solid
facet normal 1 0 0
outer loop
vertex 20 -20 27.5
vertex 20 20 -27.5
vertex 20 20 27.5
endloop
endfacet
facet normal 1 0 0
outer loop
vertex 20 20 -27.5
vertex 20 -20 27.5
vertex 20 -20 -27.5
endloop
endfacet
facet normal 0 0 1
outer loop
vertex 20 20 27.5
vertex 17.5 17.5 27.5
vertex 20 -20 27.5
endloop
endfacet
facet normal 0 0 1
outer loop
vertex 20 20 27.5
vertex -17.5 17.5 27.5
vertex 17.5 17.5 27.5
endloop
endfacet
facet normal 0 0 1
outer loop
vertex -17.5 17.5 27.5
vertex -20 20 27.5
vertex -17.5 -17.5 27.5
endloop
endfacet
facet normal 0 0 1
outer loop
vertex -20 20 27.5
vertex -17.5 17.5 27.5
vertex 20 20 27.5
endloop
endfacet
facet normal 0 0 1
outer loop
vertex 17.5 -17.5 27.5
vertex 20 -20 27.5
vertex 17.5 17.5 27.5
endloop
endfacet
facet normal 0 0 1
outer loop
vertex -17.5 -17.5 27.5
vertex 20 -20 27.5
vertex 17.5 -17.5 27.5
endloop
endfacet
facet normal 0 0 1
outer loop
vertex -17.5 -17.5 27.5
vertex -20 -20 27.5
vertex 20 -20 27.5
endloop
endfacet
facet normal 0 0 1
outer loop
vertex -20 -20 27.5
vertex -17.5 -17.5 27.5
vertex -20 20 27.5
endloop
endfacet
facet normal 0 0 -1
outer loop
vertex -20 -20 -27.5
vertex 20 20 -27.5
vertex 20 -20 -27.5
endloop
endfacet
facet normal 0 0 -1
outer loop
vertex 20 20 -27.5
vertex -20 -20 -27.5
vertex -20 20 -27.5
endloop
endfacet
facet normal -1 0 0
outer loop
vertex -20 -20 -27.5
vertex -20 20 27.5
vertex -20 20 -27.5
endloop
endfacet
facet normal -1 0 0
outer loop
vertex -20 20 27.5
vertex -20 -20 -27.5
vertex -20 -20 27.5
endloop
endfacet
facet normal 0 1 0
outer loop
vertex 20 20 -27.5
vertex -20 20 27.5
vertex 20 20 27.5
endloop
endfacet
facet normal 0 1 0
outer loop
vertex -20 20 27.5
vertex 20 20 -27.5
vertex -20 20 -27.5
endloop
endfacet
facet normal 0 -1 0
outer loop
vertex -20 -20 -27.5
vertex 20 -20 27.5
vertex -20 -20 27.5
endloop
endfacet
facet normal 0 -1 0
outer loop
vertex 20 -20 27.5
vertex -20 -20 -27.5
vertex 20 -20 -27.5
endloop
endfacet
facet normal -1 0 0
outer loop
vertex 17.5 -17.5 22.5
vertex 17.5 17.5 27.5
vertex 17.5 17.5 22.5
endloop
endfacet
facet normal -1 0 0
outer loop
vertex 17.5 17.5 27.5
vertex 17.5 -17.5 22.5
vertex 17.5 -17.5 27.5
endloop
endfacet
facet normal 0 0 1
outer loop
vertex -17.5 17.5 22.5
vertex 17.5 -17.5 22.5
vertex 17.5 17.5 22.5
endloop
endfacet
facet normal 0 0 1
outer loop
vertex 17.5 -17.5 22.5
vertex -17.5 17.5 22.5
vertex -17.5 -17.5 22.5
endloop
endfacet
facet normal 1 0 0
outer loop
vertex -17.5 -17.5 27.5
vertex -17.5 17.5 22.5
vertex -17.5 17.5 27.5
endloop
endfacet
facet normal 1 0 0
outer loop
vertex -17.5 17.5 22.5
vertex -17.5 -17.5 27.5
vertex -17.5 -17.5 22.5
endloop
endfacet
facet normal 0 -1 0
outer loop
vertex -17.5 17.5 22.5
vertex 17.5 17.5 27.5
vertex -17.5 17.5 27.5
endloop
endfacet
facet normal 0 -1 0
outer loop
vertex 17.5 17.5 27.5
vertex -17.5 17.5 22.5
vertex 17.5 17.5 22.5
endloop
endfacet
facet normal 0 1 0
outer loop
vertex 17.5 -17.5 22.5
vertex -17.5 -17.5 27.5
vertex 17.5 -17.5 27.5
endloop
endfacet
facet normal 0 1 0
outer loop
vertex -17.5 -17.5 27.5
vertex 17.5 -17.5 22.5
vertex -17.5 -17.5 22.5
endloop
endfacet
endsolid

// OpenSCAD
difference() {
    // Foot base
    // Outer edge 40mm
    // Height 55mm
    cube([40, 40, 55], center=true);
    
    // The hole in the foot
    // 35mm sides (tv bench feet are 33mm, so 2mm clearance)
    // +27.5mm to be in the middle of the top of the cube
    // 10mm to make a 5mm deep hole
    translate([0, 0, 27.5])
        cube([35, 35, 10], center=true);
}
